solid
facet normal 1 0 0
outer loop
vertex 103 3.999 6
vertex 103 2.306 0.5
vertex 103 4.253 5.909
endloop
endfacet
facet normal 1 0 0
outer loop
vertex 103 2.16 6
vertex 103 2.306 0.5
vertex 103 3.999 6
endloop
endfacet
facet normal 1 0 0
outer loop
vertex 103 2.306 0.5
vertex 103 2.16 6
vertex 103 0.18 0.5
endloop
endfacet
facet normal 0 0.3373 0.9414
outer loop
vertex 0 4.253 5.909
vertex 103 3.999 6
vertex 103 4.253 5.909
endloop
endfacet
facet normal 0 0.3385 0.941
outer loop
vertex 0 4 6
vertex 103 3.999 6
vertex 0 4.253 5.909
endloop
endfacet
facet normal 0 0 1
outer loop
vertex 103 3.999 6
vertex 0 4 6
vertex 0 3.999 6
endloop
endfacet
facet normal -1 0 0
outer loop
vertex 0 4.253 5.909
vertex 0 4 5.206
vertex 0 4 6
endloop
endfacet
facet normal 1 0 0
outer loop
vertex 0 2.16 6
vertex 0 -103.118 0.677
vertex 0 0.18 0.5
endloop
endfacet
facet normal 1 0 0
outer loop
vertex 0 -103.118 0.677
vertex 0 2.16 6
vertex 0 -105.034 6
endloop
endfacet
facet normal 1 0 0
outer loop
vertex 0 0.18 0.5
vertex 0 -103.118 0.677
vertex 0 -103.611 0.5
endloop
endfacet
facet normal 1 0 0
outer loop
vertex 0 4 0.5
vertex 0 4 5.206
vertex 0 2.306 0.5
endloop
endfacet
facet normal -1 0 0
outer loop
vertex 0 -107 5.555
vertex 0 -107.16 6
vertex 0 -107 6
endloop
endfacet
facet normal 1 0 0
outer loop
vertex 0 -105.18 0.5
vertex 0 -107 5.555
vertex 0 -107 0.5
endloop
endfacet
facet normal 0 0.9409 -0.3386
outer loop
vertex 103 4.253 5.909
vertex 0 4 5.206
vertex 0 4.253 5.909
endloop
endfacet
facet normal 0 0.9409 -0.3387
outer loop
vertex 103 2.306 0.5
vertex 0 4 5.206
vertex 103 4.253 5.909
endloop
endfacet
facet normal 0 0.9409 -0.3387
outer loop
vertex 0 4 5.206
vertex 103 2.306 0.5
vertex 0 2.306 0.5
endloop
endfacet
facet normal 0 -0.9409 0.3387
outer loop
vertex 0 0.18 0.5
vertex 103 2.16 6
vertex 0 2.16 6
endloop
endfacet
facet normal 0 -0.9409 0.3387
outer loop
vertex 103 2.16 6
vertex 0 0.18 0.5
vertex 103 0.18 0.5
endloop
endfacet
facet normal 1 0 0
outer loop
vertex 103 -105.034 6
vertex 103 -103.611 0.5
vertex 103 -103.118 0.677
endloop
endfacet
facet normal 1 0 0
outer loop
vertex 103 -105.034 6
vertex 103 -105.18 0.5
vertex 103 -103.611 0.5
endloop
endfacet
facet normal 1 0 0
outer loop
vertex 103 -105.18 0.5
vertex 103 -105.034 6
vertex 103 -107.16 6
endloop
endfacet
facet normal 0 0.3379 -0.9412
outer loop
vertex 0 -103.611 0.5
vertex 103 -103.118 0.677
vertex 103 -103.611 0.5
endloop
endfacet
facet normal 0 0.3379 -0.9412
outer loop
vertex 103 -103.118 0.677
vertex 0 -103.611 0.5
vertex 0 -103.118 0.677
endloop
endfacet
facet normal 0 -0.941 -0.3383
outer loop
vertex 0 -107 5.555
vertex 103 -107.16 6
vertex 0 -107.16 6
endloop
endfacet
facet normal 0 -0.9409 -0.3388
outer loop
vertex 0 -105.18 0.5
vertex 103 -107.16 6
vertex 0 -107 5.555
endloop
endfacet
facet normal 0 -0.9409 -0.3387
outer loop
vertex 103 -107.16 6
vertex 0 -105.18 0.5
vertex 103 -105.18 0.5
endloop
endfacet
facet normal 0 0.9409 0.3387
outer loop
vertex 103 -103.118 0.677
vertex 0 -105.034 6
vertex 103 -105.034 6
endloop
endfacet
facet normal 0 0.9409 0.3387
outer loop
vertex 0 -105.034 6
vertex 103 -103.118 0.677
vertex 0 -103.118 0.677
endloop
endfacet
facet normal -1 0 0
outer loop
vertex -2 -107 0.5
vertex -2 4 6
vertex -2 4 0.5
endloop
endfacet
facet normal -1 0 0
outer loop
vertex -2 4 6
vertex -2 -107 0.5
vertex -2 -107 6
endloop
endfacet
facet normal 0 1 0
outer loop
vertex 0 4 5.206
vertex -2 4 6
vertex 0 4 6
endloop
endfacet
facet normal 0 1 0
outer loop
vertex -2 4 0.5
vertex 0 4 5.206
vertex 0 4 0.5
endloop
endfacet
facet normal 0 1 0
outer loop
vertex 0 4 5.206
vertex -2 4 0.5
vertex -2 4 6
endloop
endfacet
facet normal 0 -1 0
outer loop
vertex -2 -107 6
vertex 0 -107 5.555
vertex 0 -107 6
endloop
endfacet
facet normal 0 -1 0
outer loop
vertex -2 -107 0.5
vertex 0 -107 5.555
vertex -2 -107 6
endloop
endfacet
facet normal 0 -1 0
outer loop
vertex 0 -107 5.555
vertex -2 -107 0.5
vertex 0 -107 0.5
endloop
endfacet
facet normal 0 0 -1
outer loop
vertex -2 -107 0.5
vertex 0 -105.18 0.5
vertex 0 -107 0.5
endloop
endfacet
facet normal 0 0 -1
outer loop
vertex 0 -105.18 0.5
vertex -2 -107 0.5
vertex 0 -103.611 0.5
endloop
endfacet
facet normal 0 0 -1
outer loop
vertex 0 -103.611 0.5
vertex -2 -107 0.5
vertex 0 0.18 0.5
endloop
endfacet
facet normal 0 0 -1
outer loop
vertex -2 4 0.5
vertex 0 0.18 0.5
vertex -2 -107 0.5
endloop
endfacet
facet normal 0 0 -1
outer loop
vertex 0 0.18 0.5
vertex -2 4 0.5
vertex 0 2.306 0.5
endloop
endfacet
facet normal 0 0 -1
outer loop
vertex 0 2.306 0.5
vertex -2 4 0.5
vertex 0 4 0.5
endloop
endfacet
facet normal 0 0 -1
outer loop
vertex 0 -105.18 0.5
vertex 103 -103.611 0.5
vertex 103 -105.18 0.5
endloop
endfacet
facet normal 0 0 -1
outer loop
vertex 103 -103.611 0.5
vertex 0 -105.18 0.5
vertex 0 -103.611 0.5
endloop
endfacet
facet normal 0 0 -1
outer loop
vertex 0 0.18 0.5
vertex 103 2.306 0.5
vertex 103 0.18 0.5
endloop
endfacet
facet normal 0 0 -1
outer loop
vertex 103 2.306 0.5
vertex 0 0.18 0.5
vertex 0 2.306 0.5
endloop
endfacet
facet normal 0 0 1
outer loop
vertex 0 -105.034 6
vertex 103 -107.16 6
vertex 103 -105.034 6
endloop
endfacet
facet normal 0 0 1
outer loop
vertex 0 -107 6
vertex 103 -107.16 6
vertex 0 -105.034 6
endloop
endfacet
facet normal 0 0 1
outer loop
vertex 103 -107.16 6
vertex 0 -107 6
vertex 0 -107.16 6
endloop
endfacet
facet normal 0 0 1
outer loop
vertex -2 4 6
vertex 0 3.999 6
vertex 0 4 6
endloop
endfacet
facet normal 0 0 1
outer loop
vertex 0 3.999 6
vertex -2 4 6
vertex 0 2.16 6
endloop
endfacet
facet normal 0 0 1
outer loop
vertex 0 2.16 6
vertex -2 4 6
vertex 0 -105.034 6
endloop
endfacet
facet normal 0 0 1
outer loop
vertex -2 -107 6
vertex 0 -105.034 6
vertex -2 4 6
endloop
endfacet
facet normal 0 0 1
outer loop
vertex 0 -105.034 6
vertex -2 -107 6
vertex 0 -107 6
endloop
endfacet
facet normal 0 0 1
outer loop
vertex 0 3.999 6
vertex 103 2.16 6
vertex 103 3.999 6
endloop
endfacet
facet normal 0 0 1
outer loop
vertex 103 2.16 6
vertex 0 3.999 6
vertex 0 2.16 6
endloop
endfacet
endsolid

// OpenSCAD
rahmen();

module rahmen() {
difference()  {
union() {
rotate([-19.8, 0, 0]) cube([103, 2, 7]);
translate([0, -105, 0]) rotate([19.8, 0, 0]) cube([103, 2, 7]);
translate([-2, -107, 0]) cube([2, 111, 7]);
}
translate([-2, -110, -1]) cube([120, 120, 1.5]);
translate([-2, -110, 6]) cube([120, 120, 1.5]);
}
}
